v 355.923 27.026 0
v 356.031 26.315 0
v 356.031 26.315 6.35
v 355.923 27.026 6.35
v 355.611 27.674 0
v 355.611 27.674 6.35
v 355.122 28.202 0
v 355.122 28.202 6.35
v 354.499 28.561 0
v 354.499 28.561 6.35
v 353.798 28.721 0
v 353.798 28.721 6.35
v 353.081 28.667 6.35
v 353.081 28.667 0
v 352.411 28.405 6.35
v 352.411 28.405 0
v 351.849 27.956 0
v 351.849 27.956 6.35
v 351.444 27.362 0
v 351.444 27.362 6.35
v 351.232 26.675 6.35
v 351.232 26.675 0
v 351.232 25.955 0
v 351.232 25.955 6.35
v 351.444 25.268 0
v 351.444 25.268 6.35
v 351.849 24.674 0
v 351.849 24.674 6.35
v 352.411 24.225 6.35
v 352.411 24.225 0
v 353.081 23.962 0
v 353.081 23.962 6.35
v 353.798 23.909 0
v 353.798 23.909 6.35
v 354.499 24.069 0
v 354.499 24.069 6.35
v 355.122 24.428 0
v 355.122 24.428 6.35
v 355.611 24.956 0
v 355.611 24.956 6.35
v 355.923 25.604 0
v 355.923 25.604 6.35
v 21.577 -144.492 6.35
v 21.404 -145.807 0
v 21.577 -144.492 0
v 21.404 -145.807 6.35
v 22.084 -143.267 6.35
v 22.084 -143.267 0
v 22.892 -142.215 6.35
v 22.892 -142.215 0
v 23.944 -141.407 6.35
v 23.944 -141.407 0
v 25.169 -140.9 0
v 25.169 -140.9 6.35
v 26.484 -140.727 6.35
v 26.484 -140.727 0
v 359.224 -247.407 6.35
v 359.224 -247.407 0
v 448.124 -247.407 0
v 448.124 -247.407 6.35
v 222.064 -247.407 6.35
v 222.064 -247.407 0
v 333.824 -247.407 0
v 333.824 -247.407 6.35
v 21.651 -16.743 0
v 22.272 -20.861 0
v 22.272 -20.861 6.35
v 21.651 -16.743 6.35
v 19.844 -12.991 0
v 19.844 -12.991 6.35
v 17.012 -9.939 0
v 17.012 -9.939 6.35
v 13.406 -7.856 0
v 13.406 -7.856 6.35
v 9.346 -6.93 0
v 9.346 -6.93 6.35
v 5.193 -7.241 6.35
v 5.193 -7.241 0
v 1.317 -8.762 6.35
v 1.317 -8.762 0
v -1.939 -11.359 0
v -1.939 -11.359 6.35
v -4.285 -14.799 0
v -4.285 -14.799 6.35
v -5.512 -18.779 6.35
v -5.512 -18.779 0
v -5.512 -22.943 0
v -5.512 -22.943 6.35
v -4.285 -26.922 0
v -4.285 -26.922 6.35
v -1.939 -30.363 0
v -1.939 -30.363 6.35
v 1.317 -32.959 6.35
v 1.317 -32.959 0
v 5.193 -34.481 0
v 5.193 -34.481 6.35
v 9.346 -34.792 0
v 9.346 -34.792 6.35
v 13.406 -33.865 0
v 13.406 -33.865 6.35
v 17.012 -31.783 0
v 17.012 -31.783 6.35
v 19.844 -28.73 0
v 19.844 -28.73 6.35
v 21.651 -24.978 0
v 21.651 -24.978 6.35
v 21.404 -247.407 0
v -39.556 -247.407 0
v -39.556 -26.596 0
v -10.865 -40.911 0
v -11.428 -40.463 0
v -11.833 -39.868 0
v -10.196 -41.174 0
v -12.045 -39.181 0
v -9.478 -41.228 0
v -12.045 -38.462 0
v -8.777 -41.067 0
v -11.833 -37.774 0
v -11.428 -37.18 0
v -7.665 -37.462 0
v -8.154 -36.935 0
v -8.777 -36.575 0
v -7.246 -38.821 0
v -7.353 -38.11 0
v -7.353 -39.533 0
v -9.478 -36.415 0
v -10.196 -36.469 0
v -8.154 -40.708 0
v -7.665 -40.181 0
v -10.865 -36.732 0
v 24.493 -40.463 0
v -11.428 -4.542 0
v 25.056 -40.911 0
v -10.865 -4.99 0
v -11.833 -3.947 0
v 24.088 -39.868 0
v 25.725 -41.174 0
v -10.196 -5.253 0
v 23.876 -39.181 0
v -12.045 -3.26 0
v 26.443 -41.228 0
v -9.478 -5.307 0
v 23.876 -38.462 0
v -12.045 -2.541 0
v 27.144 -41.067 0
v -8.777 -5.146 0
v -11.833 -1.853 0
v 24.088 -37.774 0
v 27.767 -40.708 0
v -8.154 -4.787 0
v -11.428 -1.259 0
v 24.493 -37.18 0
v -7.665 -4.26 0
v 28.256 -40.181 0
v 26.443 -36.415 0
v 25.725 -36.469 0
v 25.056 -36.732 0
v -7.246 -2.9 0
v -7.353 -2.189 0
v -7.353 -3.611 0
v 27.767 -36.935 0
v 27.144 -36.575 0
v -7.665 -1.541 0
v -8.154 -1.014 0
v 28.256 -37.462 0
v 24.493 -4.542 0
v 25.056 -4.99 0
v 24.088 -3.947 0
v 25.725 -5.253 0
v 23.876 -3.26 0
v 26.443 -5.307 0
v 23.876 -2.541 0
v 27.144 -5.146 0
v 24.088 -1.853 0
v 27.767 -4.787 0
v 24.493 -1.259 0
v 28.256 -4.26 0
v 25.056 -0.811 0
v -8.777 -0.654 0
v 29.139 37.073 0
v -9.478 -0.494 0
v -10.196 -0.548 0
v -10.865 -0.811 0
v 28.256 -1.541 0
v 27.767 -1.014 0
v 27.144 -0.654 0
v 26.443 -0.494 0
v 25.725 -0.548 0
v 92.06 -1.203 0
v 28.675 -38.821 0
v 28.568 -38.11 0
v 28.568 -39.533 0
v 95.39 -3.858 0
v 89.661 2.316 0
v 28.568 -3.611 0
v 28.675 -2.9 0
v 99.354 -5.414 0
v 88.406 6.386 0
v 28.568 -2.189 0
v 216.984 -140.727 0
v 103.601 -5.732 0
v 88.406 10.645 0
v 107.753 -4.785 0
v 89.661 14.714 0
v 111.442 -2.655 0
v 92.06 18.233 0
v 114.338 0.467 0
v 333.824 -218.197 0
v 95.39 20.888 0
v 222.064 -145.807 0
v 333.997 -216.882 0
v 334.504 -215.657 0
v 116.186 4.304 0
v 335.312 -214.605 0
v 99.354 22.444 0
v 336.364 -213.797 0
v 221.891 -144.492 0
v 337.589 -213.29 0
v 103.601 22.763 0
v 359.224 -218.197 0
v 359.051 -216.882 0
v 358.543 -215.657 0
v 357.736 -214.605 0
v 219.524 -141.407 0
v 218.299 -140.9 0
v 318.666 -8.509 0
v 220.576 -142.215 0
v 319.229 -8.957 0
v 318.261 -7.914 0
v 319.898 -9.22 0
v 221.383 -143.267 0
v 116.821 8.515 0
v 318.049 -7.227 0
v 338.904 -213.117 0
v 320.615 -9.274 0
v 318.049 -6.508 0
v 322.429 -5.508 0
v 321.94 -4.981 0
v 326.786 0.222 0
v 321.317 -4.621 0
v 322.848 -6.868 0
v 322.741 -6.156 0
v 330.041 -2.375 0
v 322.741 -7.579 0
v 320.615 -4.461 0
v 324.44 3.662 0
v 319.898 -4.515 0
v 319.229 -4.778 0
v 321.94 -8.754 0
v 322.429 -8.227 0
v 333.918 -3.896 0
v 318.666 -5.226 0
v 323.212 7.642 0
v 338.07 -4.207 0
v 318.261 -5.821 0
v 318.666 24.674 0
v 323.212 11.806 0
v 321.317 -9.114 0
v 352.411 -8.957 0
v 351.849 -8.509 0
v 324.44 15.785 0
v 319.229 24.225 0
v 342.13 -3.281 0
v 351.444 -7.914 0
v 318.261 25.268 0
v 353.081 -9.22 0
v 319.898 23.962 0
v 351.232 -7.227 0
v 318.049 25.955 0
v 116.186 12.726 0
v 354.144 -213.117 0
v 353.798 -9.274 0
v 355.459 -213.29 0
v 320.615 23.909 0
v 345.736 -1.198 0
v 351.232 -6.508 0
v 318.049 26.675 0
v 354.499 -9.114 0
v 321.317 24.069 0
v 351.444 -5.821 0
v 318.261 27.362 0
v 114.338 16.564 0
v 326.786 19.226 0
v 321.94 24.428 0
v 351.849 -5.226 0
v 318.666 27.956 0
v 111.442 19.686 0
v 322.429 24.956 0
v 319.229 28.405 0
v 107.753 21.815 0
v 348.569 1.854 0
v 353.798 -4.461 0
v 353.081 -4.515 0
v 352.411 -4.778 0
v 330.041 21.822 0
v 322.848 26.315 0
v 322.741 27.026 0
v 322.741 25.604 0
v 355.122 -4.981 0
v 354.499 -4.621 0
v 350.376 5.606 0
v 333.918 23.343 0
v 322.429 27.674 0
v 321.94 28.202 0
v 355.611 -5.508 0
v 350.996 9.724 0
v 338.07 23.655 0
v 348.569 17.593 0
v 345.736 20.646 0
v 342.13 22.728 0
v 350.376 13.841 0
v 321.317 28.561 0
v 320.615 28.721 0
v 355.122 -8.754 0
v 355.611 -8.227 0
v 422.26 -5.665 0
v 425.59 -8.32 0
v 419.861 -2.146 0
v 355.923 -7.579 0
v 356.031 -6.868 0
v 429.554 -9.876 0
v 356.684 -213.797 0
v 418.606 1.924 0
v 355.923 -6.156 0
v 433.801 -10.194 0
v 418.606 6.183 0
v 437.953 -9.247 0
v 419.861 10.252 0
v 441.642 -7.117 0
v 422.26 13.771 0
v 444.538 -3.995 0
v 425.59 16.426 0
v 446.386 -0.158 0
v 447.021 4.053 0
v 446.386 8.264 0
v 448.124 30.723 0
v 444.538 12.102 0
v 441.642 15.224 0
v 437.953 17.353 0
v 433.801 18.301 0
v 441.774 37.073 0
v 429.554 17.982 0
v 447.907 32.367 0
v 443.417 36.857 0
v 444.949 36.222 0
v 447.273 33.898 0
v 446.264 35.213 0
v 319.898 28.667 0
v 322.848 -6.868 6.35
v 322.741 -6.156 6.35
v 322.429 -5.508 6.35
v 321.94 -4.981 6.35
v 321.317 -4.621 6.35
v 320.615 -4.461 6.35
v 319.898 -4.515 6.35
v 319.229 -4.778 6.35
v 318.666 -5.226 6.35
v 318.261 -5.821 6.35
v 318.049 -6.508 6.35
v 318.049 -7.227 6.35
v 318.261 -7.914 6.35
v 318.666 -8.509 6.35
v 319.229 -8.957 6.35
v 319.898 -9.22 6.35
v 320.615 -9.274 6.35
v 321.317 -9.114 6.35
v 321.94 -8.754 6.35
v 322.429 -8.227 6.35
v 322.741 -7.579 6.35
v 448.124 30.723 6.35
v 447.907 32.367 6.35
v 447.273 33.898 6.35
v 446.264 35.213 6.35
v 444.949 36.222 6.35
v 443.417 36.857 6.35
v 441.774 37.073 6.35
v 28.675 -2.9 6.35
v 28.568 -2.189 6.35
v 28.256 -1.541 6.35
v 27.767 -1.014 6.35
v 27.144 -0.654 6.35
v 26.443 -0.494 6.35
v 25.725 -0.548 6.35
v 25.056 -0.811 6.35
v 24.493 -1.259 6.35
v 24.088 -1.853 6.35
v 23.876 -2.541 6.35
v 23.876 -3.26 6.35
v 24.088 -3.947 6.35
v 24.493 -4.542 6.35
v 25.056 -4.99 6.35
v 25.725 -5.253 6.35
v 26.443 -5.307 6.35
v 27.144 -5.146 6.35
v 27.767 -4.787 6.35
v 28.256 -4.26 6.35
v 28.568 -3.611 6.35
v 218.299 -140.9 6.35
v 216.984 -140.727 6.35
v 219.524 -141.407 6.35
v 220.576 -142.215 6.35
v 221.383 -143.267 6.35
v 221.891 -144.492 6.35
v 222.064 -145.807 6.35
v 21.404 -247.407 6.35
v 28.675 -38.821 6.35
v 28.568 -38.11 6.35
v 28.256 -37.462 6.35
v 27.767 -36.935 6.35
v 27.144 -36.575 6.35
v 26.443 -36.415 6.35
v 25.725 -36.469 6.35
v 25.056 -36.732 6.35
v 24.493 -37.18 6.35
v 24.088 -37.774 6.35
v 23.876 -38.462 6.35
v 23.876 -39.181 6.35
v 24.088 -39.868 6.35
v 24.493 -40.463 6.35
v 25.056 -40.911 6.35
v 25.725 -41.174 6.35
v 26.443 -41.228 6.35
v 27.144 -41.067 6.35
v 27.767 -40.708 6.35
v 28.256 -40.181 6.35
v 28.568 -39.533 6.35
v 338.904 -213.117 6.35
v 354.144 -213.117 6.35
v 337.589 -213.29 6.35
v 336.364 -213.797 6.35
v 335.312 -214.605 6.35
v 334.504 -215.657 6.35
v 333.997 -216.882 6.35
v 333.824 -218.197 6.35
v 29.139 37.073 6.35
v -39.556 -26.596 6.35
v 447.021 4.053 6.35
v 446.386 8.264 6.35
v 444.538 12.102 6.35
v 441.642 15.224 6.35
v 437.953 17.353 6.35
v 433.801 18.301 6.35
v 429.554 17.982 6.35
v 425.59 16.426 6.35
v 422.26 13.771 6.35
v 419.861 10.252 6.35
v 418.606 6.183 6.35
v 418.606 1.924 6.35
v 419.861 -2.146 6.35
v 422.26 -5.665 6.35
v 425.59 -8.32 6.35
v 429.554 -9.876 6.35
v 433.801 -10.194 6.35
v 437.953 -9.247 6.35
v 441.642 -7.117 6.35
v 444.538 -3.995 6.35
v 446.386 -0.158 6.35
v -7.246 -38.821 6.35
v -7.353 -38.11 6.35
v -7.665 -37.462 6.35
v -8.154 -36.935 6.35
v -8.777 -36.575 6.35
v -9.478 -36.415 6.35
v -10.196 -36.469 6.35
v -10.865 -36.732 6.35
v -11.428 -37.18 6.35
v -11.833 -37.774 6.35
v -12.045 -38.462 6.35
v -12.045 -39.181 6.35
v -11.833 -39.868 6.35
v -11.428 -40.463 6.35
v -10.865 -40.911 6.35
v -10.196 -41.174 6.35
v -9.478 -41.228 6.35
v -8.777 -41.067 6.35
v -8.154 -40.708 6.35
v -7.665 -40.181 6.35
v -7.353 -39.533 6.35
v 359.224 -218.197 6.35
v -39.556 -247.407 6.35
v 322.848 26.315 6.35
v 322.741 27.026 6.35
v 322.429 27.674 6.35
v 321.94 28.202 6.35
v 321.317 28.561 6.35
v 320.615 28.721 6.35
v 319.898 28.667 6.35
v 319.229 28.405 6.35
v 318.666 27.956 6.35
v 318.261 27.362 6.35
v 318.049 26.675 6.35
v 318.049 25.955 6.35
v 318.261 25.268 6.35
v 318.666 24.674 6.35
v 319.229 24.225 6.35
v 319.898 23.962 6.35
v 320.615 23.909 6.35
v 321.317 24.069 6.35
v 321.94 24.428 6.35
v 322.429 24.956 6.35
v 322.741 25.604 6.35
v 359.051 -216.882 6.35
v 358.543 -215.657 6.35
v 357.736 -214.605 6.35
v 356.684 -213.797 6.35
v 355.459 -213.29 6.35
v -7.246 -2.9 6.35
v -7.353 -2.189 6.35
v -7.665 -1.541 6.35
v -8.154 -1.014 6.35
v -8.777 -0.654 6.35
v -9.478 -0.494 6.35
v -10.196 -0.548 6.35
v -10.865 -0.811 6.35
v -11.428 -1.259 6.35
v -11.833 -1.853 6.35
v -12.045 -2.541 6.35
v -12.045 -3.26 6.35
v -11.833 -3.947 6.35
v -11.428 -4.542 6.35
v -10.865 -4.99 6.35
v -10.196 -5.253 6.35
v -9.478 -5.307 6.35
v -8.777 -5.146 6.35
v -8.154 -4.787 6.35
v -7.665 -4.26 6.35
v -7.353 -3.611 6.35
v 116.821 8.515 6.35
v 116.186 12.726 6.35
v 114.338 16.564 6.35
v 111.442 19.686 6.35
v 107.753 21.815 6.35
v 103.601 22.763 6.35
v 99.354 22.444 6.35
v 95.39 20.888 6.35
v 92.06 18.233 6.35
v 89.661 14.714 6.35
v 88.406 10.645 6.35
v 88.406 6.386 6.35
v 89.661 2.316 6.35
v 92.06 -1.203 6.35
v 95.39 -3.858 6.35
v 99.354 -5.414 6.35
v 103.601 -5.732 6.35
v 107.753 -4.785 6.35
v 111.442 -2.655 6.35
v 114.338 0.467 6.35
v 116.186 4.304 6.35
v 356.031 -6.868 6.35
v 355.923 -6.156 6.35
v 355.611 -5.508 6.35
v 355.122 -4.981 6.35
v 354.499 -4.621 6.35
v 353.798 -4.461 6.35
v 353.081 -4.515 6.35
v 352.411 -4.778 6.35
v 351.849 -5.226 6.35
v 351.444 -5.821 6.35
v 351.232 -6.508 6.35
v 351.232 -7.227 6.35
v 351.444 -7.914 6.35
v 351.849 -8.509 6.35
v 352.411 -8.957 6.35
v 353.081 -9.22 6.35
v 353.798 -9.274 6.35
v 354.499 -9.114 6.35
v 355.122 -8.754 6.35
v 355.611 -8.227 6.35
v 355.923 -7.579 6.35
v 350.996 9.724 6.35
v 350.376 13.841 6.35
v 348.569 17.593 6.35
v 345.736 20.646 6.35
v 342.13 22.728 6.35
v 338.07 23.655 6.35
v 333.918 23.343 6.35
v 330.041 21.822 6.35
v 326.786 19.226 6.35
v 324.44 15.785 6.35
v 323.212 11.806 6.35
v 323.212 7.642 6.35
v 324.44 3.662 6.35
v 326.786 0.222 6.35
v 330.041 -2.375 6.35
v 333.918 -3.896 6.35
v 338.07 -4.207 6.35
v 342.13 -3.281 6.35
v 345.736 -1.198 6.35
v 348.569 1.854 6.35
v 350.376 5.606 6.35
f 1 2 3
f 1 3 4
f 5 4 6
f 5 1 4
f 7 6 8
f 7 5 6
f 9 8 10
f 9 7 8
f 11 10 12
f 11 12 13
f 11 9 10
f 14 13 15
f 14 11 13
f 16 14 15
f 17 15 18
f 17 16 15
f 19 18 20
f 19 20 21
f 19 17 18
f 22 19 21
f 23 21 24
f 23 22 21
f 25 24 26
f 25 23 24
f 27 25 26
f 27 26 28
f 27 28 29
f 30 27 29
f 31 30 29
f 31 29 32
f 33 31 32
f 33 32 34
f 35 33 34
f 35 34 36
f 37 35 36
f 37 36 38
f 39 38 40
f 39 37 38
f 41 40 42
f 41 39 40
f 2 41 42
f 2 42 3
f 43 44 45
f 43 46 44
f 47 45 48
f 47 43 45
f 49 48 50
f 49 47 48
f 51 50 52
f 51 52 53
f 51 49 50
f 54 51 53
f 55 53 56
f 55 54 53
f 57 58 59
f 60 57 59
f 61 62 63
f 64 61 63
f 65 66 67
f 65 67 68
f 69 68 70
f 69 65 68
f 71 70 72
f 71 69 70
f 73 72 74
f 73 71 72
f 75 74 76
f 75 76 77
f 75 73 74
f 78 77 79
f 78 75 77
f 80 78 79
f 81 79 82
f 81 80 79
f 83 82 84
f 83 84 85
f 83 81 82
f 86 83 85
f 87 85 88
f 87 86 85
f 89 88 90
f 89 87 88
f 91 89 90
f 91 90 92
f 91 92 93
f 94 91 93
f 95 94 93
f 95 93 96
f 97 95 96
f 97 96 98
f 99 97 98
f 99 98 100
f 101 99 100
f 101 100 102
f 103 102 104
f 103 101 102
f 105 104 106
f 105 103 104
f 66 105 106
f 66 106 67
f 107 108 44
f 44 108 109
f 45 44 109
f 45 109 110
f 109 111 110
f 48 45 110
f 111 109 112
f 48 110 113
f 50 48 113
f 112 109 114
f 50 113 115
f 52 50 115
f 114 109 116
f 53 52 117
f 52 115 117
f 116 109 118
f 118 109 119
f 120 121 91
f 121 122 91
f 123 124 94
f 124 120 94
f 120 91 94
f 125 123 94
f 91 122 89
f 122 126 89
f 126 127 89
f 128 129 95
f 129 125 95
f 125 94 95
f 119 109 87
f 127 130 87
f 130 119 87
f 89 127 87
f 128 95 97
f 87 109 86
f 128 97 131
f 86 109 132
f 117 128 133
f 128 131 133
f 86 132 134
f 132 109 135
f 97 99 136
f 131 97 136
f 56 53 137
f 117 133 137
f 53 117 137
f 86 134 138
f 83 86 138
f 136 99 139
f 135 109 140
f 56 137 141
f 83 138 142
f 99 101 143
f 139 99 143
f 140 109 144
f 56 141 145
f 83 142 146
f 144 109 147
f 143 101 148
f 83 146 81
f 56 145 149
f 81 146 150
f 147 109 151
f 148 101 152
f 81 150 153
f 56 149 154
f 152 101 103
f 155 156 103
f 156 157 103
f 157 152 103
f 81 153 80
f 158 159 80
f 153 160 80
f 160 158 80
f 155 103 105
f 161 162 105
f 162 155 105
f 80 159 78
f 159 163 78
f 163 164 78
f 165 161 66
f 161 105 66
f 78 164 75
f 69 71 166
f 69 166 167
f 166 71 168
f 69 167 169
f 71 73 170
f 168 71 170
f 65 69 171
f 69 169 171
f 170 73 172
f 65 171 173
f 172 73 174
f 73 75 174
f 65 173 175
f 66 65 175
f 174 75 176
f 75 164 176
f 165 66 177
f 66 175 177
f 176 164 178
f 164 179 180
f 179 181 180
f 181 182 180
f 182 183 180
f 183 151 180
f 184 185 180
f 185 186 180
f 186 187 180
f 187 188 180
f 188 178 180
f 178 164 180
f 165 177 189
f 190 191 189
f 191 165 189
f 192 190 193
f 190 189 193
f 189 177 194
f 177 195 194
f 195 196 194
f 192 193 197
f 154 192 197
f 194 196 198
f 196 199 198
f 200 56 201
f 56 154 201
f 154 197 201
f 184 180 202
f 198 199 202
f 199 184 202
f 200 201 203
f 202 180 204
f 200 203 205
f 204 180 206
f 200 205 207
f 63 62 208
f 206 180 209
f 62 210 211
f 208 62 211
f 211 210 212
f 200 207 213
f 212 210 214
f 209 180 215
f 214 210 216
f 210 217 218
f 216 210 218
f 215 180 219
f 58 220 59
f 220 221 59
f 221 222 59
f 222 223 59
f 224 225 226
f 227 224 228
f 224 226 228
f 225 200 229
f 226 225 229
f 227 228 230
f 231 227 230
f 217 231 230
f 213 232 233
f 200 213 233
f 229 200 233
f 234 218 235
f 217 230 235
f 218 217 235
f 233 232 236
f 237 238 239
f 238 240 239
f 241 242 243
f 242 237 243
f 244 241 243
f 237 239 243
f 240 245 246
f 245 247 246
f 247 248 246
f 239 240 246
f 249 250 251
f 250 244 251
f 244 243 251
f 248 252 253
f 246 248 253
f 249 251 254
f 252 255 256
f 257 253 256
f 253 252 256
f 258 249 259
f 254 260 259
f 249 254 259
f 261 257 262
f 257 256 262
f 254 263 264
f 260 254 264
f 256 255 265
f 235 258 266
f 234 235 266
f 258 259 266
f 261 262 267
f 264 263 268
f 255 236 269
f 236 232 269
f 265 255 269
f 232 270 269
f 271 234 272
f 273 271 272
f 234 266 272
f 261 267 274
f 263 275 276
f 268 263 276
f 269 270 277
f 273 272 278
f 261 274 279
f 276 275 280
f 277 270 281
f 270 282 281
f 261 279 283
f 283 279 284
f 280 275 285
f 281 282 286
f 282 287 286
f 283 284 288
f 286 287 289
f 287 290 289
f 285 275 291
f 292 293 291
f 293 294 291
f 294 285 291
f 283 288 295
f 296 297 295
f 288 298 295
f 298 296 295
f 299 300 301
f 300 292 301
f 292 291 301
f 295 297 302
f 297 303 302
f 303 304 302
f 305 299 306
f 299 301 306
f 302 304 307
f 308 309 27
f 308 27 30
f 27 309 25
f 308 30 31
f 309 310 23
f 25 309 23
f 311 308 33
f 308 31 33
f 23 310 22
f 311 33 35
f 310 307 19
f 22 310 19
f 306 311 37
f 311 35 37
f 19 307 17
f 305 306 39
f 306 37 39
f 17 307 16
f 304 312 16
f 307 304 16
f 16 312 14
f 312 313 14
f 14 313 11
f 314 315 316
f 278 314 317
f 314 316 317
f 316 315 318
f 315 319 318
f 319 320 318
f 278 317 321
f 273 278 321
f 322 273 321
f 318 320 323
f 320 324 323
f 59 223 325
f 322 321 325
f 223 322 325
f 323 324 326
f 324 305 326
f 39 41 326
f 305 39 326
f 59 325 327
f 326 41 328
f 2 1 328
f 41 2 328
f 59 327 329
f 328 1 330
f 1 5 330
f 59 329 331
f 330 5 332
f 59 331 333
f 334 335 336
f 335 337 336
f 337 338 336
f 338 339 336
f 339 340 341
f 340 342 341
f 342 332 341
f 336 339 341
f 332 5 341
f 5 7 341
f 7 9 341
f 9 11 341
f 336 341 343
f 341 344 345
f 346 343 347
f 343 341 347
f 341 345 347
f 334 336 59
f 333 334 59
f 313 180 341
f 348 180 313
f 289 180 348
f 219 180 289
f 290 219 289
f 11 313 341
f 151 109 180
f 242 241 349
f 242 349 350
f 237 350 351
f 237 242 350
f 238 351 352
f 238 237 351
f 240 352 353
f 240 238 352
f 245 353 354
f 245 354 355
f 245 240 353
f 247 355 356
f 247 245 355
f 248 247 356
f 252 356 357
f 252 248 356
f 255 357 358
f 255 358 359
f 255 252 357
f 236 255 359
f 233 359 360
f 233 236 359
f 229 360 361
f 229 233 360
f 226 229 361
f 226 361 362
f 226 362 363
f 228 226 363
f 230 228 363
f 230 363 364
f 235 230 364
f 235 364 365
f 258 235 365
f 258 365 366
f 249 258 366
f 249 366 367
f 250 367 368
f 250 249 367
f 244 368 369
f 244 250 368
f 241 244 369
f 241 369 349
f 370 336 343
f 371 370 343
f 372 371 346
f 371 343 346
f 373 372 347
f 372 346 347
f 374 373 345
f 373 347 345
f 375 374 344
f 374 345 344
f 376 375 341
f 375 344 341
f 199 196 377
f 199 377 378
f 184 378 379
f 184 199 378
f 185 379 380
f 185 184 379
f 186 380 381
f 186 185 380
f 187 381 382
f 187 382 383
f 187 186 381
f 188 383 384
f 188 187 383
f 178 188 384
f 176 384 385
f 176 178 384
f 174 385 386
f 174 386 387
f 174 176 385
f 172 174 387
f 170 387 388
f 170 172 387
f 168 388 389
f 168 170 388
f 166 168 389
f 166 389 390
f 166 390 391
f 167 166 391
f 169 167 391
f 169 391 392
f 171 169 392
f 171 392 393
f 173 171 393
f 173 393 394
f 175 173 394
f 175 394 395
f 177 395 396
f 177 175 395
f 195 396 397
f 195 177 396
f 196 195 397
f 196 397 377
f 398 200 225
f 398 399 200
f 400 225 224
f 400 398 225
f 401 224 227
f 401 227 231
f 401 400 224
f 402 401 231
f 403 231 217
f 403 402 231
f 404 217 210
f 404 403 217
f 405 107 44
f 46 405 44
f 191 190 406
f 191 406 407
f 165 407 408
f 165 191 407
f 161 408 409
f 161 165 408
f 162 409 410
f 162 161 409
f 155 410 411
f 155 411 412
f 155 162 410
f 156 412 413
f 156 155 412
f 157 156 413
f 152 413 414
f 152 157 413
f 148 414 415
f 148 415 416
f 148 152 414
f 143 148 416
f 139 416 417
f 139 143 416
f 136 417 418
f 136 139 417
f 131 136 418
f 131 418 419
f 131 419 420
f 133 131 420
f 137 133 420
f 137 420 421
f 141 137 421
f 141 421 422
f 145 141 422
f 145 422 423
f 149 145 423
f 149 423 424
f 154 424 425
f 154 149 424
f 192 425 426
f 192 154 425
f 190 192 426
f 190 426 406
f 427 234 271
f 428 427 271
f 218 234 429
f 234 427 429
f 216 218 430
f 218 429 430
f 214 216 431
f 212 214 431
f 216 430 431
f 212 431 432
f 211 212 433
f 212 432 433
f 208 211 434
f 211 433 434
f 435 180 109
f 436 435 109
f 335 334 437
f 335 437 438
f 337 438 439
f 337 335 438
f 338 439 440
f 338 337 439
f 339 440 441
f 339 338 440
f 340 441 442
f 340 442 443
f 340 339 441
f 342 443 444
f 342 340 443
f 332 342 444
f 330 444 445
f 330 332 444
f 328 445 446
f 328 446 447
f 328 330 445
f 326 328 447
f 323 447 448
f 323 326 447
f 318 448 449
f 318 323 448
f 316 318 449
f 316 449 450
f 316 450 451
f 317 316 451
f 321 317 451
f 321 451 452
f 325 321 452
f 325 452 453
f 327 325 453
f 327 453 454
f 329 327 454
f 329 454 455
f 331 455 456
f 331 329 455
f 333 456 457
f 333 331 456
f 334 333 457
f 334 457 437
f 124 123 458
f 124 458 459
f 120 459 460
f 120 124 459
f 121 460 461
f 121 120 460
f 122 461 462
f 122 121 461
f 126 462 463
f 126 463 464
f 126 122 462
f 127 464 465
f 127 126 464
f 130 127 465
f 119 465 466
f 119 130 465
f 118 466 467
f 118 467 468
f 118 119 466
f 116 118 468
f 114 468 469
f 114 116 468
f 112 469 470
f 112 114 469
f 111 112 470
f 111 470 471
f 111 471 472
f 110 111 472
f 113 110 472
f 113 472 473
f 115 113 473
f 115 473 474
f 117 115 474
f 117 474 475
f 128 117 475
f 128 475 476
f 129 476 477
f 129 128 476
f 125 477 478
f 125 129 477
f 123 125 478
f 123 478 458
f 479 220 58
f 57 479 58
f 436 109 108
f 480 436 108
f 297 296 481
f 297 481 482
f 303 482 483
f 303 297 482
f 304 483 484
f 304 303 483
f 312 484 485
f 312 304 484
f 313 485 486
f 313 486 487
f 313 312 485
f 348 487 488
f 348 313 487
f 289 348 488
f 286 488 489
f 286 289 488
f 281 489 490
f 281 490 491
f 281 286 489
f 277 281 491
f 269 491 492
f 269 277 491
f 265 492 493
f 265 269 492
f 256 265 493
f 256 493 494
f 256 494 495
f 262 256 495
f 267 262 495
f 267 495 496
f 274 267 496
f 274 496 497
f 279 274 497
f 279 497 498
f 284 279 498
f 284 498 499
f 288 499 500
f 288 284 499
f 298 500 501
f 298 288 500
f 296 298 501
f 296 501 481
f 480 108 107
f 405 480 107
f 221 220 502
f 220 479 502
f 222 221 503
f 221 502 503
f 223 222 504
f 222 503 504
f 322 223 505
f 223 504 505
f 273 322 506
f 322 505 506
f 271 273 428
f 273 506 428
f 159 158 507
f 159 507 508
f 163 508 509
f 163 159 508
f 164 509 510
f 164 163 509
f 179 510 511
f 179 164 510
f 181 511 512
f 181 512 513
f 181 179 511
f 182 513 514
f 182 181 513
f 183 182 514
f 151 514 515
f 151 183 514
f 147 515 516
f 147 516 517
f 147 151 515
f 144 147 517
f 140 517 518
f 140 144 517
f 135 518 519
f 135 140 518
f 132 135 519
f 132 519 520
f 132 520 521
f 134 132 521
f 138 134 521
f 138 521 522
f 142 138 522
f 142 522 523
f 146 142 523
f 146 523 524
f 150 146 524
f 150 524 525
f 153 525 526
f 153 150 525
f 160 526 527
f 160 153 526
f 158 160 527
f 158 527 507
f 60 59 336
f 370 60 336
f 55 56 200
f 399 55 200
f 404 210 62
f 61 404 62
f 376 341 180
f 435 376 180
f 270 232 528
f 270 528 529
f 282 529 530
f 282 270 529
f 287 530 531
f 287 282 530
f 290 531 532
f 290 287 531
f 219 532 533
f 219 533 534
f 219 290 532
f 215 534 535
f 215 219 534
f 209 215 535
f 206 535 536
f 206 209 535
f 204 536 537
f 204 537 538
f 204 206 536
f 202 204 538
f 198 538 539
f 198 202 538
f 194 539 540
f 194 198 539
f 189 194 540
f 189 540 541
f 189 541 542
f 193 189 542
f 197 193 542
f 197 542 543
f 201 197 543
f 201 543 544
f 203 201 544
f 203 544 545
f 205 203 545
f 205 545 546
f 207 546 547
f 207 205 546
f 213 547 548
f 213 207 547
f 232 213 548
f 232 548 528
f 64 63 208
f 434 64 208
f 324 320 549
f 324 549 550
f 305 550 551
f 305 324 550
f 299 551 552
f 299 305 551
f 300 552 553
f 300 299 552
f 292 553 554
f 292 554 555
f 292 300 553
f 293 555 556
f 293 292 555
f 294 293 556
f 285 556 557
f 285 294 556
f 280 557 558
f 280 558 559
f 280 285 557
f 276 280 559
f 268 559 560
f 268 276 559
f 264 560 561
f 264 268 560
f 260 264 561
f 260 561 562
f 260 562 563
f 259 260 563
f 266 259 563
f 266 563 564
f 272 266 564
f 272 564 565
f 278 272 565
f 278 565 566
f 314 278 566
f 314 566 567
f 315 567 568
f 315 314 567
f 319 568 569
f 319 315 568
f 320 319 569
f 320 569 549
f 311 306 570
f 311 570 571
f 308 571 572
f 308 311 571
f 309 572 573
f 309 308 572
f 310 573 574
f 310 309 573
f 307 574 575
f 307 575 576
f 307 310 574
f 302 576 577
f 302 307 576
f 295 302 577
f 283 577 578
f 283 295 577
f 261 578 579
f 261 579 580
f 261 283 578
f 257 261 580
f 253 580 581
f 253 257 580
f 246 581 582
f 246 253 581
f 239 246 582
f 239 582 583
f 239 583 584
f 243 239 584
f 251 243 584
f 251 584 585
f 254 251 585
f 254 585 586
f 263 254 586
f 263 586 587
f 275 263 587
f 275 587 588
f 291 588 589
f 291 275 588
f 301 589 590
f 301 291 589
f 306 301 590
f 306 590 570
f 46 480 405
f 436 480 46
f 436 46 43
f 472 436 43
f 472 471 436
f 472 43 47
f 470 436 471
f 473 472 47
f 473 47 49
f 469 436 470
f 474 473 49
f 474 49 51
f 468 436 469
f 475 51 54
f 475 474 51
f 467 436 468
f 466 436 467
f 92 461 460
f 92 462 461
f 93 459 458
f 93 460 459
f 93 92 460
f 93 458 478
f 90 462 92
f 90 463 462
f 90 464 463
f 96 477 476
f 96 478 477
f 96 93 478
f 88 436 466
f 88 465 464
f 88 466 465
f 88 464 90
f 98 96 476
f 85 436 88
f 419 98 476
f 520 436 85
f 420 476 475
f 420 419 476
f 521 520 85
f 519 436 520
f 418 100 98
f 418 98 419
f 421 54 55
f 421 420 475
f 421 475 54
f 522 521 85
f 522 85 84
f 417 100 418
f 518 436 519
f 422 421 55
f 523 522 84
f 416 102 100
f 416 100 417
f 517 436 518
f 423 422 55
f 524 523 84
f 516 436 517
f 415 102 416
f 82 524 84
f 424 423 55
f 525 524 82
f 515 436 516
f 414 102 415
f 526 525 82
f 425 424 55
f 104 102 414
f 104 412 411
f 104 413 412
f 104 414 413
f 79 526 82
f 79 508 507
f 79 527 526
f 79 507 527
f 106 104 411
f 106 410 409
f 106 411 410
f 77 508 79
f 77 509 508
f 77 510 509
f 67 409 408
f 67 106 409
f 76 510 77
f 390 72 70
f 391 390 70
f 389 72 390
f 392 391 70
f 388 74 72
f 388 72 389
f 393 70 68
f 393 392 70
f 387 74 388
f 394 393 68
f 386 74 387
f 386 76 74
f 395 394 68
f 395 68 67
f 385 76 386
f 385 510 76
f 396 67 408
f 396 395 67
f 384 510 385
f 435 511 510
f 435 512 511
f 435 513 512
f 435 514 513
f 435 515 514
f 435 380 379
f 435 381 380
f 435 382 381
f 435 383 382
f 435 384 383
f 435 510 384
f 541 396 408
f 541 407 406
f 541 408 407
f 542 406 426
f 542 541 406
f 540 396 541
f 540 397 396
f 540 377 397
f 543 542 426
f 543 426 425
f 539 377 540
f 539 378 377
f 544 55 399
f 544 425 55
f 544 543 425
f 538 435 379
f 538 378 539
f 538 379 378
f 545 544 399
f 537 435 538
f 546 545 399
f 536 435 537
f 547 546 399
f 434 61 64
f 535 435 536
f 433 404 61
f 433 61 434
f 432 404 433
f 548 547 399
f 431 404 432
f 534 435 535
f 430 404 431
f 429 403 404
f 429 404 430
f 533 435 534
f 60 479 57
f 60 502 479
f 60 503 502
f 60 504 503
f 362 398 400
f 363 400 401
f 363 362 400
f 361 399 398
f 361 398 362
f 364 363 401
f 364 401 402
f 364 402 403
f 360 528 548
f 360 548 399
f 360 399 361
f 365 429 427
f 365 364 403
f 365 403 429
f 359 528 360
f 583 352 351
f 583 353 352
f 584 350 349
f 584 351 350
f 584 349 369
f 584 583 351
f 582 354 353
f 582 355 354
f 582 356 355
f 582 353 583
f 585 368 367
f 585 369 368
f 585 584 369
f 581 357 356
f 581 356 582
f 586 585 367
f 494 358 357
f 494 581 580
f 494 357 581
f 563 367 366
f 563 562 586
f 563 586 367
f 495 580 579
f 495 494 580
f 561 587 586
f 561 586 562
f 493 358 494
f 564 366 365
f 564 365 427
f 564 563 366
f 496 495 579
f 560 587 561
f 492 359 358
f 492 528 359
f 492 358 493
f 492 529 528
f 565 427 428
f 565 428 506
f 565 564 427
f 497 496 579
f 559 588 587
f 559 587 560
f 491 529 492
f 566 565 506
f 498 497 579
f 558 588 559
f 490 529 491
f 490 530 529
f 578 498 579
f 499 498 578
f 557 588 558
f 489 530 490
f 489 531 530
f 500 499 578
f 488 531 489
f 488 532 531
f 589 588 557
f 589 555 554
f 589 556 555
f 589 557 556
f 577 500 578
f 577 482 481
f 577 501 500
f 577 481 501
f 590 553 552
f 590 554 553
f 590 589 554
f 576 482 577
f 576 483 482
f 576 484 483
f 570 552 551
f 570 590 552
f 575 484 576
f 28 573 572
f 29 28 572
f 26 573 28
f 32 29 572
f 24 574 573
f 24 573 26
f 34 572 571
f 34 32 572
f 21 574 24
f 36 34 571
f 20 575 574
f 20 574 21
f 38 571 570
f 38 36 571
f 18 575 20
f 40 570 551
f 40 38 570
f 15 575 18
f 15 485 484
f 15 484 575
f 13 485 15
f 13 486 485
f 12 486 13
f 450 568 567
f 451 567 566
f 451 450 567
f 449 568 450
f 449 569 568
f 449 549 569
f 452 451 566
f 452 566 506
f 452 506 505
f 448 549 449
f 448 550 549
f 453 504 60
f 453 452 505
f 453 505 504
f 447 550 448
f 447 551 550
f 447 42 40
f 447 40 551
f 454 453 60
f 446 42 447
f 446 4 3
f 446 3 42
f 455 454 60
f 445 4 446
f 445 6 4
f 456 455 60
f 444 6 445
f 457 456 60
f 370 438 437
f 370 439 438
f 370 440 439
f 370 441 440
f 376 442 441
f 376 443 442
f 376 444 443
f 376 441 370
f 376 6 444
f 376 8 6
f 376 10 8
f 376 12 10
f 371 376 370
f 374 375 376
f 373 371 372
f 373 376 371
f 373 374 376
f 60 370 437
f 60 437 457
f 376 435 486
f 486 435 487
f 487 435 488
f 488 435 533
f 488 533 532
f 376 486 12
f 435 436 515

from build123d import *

# Parameters (mm, degrees)
F0_R     = 2.413
F0_R_2   = 13.97
F0_R_3   = 14.2875
F1_DEPTH = 6.35
F2_R     = 5.08


# Not quite as in the source:
# - a length typed as a fraction of an inch, garbled in the dataset ("3 / 203.2 mm" for 3/8 in), is restored


with BuildPart() as f1:
    # F0 (on Top) → F1 (new body)
    with BuildSketch(Plane.XY):
        with BuildLine():
            Line((441.7738245296, 37.0731139821), (29.1392452401, 37.0731139821))
            Line((29.1392452401, 37.0731139821), (-39.5561754704, -26.5958569453))
            Line((-39.5561754704, -26.5958569453), (-39.5561754704, -247.4068860179))
            Line((-39.5561754704, -247.4068860179), (21.4038245296, -247.4068860179))
            Line((21.4038245296, -247.4068860179), (21.4038245296, -140.7268860179))
            Line((21.4038245296, -140.7268860179), (222.0638245296, -140.7268860179))
            Line((222.0638245296, -140.7268860179), (222.0638245296, -247.4068860179))
            Line((222.0638245296, -247.4068860179), (333.8238245296, -247.4068860179))
            Line((333.8238245296, -247.4068860179), (333.8238245296, -213.1168860179))
            Line((333.8238245296, -213.1168860179), (359.2238245296, -213.1168860179))
            Line((359.2238245296, -213.1168860179), (359.2238245296, -247.4068860179))
            Line((359.2238245296, -247.4068860179), (448.1238245296, -247.4068860179))
            Line((448.1238245296, -247.4068860179), (448.1238245296, 30.7231139821))
            ThreePointArc((448.1238245296, 30.7231139821), (446.2639525902, 35.2132420426), (441.7738245296, 37.0731139821))
        make_face()
        with Locations((-9.6586965698, -38.8212736462)):
            Circle(F0_R, mode=Mode.SUBTRACT)
        with Locations((26.2623279145, -38.8212736462)):
            Circle(F0_R, mode=Mode.SUBTRACT)
        with Locations((8.3018156723, -20.860761404)):
            Circle(F0_R_2, mode=Mode.SUBTRACT)
        with Locations((-9.6586965698, -2.9002491619)):
            Circle(F0_R, mode=Mode.SUBTRACT)
        with Locations((26.2623279145, -2.9002491619)):
            Circle(F0_R, mode=Mode.SUBTRACT)
        with Locations((102.5335357666, 8.5151046671)):
            Circle(F0_R_3, mode=Mode.SUBTRACT)
        with Locations((320.4351010724, -6.8675098969)):
            Circle(F0_R, mode=Mode.SUBTRACT)
        with Locations((320.4351010724, 26.3149594916)):
            Circle(F0_R, mode=Mode.SUBTRACT)
        with Locations((353.6175704608, -6.8675098969)):
            Circle(F0_R, mode=Mode.SUBTRACT)
        with Locations((337.0263357666, 9.7237247974)):
            Circle(F0_R_2, mode=Mode.SUBTRACT)
        with Locations((353.6175704608, 26.3149594916)):
            Circle(F0_R, mode=Mode.SUBTRACT)
        with Locations((432.7335357666, 4.0531139821)):
            Circle(F0_R_3, mode=Mode.SUBTRACT)
    extrude(amount=F1_DEPTH)

    # F2
    f2_edges = [f1.edges().sort_by_distance(p)[0] for p in [
        (21.403825, -140.726886, 3.175),
        (222.063825, -140.726886, 3.175),
        (333.823825, -213.116886, 3.175),
        (359.223825, -213.116886, 3.175),
    ]]
    fillet(f2_edges, radius=F2_R)


solid = f1.part
